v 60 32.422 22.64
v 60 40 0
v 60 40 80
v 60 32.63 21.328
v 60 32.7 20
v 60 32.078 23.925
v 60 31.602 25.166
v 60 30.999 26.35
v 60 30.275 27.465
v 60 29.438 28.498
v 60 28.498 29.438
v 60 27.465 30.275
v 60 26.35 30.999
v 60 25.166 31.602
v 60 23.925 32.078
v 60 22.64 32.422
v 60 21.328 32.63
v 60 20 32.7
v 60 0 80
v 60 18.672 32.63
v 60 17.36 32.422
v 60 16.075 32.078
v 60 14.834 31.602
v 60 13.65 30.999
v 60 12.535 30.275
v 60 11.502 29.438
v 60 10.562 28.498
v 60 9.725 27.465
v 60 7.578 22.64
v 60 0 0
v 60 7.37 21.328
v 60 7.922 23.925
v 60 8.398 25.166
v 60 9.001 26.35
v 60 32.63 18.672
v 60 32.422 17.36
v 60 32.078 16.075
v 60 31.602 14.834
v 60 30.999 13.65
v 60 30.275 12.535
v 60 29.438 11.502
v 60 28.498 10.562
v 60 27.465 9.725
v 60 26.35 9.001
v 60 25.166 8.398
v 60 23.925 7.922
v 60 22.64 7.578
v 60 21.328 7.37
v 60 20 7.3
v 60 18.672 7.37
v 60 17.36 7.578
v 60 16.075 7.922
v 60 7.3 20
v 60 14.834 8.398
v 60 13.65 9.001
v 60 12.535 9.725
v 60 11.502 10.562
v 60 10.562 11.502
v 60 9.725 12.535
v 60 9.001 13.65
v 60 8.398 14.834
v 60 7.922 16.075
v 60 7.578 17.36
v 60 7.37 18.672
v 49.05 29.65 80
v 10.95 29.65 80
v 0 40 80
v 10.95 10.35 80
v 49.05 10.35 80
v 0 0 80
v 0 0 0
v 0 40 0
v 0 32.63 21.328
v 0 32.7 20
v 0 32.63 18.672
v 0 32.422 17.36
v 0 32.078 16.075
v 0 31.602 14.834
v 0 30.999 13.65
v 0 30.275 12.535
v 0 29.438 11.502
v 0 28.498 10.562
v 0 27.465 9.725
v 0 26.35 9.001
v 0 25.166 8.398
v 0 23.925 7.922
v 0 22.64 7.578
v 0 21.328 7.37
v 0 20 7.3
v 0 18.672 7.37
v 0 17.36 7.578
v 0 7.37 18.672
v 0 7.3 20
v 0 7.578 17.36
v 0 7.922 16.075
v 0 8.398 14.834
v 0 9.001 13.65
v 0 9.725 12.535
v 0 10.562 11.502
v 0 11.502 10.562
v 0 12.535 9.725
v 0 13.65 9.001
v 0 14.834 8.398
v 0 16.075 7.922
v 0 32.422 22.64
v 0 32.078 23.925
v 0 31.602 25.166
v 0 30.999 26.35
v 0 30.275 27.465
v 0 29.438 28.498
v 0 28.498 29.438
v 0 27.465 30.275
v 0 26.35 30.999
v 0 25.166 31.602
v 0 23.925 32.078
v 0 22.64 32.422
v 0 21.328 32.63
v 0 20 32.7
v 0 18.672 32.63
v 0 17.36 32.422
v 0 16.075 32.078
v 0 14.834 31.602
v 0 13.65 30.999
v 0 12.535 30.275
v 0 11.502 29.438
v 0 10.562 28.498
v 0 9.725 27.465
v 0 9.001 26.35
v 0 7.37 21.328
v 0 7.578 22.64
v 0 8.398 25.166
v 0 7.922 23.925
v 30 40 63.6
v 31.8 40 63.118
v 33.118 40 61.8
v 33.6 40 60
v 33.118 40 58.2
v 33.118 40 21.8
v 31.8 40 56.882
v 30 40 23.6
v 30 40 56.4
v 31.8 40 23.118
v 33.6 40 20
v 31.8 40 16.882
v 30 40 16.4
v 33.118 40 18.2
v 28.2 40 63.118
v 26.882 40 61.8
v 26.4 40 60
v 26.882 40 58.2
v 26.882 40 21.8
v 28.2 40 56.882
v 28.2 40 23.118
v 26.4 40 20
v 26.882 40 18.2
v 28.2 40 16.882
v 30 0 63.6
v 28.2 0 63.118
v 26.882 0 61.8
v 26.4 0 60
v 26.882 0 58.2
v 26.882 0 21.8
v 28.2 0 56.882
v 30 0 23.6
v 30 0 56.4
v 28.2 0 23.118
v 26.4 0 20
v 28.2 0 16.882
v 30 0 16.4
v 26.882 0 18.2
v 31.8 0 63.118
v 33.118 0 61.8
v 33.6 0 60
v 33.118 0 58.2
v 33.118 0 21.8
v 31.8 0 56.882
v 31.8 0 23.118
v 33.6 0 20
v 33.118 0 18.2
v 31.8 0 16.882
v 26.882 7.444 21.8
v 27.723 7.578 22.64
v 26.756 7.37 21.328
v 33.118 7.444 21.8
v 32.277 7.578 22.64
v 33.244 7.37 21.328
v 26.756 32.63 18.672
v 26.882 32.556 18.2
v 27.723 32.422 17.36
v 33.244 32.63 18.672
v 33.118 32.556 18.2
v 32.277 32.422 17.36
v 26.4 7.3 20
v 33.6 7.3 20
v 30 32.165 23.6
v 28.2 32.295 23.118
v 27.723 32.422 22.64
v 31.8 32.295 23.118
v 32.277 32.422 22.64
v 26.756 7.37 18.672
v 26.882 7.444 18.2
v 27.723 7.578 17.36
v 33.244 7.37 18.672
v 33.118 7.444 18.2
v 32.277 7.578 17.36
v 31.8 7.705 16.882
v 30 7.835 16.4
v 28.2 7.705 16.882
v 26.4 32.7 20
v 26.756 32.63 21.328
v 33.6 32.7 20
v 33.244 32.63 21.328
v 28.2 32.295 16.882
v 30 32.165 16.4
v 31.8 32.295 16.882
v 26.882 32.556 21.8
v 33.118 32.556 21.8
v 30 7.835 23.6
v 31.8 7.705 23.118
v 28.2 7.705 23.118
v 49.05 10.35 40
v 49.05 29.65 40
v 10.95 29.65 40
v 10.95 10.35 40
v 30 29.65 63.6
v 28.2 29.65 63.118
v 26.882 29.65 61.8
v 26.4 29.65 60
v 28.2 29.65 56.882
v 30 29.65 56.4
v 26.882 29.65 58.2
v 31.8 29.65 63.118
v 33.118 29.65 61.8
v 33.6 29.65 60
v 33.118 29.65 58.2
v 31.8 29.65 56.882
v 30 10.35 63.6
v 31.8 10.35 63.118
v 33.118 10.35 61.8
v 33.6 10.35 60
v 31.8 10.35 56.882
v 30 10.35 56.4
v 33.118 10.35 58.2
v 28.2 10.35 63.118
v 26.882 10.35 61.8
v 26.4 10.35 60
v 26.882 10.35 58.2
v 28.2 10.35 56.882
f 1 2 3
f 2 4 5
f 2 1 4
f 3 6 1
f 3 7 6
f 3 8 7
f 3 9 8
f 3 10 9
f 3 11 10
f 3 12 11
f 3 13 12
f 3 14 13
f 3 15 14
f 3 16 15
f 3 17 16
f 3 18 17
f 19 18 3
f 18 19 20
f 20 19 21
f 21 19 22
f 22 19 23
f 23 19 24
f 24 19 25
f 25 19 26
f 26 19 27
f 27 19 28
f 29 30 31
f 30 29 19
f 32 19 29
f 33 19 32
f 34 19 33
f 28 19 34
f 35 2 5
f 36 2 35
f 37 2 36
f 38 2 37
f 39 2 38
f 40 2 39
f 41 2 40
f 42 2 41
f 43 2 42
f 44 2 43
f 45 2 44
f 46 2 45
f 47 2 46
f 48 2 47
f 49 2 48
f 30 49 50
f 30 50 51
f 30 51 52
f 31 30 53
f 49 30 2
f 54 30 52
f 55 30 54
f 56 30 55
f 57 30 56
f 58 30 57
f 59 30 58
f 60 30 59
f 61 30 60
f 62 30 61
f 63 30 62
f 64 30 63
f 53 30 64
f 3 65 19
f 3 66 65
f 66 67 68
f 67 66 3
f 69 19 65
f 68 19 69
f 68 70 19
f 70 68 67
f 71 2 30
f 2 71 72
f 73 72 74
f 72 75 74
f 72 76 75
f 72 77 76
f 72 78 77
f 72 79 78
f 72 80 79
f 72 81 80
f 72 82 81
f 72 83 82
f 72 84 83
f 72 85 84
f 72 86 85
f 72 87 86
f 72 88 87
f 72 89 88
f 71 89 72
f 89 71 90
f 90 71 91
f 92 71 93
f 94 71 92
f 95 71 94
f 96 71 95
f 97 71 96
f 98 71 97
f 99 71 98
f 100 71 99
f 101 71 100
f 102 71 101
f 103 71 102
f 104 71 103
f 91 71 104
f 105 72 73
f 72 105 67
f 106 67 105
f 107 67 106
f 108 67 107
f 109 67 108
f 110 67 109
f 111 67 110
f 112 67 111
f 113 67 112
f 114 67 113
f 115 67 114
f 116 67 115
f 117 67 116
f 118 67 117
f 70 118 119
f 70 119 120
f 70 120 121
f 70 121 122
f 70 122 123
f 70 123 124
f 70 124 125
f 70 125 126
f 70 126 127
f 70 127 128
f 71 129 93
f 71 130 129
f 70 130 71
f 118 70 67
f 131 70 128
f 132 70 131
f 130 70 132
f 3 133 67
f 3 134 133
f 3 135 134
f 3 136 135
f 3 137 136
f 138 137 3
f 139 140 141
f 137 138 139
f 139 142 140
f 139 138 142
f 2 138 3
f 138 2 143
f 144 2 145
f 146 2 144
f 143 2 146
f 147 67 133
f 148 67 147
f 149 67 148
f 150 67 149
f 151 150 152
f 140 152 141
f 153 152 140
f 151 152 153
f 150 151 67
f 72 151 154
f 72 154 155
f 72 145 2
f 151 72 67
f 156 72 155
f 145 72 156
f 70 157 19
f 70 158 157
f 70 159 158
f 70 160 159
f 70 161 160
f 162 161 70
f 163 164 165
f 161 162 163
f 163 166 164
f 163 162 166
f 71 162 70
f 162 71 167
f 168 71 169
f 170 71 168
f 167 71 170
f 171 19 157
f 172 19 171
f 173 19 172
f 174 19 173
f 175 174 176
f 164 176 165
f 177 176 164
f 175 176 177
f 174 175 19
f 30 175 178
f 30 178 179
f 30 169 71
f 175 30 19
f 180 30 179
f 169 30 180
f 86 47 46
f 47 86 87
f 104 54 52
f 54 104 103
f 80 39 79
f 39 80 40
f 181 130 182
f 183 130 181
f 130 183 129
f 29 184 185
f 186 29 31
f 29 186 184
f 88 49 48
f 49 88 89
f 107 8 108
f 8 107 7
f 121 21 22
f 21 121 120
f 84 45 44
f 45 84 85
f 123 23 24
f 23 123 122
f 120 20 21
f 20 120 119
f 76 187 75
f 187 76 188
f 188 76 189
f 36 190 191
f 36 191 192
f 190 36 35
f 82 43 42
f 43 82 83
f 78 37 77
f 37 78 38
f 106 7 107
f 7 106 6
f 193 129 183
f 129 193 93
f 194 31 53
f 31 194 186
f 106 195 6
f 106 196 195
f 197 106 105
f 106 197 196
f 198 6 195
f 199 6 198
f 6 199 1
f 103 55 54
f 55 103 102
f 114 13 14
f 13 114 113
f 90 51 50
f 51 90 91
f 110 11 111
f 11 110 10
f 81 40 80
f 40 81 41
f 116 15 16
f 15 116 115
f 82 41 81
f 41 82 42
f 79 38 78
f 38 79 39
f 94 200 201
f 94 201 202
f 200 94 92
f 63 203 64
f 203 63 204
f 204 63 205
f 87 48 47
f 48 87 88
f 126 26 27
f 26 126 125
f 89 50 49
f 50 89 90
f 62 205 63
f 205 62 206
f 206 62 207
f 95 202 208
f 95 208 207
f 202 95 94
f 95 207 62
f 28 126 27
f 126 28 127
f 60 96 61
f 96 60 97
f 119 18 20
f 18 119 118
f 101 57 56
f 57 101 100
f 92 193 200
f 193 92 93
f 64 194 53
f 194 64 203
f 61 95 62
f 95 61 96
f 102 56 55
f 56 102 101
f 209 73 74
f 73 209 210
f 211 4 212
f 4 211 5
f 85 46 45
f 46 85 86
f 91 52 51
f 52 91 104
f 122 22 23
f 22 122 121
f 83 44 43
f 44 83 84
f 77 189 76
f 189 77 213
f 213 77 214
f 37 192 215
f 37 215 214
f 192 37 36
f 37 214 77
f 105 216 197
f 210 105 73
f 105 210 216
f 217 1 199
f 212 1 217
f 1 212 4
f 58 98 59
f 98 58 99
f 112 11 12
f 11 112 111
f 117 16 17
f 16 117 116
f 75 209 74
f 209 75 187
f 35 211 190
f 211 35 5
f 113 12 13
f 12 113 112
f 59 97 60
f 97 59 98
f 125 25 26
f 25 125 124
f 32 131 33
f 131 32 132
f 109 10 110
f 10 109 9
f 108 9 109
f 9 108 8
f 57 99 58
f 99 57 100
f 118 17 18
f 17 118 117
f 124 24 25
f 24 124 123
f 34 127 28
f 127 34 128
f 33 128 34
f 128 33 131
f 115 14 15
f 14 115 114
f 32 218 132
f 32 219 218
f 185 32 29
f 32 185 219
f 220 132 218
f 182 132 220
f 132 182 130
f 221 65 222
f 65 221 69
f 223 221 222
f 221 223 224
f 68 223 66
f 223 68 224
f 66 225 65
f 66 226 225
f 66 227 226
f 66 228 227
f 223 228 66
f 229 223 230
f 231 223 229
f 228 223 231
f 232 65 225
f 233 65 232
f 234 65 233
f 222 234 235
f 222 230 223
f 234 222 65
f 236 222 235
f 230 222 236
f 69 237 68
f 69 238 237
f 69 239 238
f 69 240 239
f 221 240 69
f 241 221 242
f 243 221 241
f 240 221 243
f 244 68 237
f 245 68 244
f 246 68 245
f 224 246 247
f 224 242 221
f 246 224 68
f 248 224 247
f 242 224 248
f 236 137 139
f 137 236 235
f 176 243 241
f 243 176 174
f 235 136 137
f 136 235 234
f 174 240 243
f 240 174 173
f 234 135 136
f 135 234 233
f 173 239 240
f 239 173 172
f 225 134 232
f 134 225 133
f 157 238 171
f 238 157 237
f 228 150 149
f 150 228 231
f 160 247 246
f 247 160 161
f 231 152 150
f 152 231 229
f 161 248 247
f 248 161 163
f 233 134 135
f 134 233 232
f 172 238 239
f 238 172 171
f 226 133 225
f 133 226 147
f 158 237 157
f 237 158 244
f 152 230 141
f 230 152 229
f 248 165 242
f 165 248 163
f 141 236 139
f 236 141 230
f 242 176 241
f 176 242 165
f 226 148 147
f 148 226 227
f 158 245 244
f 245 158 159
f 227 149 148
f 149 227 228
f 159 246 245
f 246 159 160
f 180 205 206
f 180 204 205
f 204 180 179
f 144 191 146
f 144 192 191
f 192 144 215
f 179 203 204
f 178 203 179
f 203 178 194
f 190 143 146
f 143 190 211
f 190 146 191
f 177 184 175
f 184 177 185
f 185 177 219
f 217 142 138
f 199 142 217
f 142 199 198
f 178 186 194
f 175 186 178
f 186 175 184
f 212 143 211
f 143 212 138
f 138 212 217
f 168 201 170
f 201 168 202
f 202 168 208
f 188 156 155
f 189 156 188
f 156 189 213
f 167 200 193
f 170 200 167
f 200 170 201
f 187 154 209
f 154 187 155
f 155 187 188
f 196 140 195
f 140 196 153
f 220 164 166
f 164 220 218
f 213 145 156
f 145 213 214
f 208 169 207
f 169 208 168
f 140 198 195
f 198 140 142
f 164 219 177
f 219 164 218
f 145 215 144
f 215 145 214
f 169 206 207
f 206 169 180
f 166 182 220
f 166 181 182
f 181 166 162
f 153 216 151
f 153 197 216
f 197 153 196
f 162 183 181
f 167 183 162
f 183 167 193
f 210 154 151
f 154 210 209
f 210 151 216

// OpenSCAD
tmx=60; //tap mount 
tmy=40;
tmz=80;

army=19.3;
armx=38.1;
armz=100;

sleeved=25.4; //sleeve diameter

screwd=8*.9;

module armbracket(){
    difference(){
        cube([tmx,tmy,tmz]);
        translate([-1,tmy/2,tmy/2]){
            rotate([0,90,0]){
                cylinder(d=sleeved,h=tmx+2,$fn=60);
            }
        }
        translate([tmx/2-armx/2,tmy/2-army/2,tmz/2]){
            cube([armx,army,armz]);
        }
        
        //arm mount hole
        translate([tmx/2,-1,tmz*.75]){
            rotate([-90,0,0]){
                cylinder(d=screwd,h=tmy+2);
            }
        }
        
        //sleeve screw hole
        translate([tmx/2,-1,tmz*.25]){
            rotate([-90,0,0]){
                cylinder(d=screwd,h=tmy+2);
            }
        }
        
    }
}
armbracket();
